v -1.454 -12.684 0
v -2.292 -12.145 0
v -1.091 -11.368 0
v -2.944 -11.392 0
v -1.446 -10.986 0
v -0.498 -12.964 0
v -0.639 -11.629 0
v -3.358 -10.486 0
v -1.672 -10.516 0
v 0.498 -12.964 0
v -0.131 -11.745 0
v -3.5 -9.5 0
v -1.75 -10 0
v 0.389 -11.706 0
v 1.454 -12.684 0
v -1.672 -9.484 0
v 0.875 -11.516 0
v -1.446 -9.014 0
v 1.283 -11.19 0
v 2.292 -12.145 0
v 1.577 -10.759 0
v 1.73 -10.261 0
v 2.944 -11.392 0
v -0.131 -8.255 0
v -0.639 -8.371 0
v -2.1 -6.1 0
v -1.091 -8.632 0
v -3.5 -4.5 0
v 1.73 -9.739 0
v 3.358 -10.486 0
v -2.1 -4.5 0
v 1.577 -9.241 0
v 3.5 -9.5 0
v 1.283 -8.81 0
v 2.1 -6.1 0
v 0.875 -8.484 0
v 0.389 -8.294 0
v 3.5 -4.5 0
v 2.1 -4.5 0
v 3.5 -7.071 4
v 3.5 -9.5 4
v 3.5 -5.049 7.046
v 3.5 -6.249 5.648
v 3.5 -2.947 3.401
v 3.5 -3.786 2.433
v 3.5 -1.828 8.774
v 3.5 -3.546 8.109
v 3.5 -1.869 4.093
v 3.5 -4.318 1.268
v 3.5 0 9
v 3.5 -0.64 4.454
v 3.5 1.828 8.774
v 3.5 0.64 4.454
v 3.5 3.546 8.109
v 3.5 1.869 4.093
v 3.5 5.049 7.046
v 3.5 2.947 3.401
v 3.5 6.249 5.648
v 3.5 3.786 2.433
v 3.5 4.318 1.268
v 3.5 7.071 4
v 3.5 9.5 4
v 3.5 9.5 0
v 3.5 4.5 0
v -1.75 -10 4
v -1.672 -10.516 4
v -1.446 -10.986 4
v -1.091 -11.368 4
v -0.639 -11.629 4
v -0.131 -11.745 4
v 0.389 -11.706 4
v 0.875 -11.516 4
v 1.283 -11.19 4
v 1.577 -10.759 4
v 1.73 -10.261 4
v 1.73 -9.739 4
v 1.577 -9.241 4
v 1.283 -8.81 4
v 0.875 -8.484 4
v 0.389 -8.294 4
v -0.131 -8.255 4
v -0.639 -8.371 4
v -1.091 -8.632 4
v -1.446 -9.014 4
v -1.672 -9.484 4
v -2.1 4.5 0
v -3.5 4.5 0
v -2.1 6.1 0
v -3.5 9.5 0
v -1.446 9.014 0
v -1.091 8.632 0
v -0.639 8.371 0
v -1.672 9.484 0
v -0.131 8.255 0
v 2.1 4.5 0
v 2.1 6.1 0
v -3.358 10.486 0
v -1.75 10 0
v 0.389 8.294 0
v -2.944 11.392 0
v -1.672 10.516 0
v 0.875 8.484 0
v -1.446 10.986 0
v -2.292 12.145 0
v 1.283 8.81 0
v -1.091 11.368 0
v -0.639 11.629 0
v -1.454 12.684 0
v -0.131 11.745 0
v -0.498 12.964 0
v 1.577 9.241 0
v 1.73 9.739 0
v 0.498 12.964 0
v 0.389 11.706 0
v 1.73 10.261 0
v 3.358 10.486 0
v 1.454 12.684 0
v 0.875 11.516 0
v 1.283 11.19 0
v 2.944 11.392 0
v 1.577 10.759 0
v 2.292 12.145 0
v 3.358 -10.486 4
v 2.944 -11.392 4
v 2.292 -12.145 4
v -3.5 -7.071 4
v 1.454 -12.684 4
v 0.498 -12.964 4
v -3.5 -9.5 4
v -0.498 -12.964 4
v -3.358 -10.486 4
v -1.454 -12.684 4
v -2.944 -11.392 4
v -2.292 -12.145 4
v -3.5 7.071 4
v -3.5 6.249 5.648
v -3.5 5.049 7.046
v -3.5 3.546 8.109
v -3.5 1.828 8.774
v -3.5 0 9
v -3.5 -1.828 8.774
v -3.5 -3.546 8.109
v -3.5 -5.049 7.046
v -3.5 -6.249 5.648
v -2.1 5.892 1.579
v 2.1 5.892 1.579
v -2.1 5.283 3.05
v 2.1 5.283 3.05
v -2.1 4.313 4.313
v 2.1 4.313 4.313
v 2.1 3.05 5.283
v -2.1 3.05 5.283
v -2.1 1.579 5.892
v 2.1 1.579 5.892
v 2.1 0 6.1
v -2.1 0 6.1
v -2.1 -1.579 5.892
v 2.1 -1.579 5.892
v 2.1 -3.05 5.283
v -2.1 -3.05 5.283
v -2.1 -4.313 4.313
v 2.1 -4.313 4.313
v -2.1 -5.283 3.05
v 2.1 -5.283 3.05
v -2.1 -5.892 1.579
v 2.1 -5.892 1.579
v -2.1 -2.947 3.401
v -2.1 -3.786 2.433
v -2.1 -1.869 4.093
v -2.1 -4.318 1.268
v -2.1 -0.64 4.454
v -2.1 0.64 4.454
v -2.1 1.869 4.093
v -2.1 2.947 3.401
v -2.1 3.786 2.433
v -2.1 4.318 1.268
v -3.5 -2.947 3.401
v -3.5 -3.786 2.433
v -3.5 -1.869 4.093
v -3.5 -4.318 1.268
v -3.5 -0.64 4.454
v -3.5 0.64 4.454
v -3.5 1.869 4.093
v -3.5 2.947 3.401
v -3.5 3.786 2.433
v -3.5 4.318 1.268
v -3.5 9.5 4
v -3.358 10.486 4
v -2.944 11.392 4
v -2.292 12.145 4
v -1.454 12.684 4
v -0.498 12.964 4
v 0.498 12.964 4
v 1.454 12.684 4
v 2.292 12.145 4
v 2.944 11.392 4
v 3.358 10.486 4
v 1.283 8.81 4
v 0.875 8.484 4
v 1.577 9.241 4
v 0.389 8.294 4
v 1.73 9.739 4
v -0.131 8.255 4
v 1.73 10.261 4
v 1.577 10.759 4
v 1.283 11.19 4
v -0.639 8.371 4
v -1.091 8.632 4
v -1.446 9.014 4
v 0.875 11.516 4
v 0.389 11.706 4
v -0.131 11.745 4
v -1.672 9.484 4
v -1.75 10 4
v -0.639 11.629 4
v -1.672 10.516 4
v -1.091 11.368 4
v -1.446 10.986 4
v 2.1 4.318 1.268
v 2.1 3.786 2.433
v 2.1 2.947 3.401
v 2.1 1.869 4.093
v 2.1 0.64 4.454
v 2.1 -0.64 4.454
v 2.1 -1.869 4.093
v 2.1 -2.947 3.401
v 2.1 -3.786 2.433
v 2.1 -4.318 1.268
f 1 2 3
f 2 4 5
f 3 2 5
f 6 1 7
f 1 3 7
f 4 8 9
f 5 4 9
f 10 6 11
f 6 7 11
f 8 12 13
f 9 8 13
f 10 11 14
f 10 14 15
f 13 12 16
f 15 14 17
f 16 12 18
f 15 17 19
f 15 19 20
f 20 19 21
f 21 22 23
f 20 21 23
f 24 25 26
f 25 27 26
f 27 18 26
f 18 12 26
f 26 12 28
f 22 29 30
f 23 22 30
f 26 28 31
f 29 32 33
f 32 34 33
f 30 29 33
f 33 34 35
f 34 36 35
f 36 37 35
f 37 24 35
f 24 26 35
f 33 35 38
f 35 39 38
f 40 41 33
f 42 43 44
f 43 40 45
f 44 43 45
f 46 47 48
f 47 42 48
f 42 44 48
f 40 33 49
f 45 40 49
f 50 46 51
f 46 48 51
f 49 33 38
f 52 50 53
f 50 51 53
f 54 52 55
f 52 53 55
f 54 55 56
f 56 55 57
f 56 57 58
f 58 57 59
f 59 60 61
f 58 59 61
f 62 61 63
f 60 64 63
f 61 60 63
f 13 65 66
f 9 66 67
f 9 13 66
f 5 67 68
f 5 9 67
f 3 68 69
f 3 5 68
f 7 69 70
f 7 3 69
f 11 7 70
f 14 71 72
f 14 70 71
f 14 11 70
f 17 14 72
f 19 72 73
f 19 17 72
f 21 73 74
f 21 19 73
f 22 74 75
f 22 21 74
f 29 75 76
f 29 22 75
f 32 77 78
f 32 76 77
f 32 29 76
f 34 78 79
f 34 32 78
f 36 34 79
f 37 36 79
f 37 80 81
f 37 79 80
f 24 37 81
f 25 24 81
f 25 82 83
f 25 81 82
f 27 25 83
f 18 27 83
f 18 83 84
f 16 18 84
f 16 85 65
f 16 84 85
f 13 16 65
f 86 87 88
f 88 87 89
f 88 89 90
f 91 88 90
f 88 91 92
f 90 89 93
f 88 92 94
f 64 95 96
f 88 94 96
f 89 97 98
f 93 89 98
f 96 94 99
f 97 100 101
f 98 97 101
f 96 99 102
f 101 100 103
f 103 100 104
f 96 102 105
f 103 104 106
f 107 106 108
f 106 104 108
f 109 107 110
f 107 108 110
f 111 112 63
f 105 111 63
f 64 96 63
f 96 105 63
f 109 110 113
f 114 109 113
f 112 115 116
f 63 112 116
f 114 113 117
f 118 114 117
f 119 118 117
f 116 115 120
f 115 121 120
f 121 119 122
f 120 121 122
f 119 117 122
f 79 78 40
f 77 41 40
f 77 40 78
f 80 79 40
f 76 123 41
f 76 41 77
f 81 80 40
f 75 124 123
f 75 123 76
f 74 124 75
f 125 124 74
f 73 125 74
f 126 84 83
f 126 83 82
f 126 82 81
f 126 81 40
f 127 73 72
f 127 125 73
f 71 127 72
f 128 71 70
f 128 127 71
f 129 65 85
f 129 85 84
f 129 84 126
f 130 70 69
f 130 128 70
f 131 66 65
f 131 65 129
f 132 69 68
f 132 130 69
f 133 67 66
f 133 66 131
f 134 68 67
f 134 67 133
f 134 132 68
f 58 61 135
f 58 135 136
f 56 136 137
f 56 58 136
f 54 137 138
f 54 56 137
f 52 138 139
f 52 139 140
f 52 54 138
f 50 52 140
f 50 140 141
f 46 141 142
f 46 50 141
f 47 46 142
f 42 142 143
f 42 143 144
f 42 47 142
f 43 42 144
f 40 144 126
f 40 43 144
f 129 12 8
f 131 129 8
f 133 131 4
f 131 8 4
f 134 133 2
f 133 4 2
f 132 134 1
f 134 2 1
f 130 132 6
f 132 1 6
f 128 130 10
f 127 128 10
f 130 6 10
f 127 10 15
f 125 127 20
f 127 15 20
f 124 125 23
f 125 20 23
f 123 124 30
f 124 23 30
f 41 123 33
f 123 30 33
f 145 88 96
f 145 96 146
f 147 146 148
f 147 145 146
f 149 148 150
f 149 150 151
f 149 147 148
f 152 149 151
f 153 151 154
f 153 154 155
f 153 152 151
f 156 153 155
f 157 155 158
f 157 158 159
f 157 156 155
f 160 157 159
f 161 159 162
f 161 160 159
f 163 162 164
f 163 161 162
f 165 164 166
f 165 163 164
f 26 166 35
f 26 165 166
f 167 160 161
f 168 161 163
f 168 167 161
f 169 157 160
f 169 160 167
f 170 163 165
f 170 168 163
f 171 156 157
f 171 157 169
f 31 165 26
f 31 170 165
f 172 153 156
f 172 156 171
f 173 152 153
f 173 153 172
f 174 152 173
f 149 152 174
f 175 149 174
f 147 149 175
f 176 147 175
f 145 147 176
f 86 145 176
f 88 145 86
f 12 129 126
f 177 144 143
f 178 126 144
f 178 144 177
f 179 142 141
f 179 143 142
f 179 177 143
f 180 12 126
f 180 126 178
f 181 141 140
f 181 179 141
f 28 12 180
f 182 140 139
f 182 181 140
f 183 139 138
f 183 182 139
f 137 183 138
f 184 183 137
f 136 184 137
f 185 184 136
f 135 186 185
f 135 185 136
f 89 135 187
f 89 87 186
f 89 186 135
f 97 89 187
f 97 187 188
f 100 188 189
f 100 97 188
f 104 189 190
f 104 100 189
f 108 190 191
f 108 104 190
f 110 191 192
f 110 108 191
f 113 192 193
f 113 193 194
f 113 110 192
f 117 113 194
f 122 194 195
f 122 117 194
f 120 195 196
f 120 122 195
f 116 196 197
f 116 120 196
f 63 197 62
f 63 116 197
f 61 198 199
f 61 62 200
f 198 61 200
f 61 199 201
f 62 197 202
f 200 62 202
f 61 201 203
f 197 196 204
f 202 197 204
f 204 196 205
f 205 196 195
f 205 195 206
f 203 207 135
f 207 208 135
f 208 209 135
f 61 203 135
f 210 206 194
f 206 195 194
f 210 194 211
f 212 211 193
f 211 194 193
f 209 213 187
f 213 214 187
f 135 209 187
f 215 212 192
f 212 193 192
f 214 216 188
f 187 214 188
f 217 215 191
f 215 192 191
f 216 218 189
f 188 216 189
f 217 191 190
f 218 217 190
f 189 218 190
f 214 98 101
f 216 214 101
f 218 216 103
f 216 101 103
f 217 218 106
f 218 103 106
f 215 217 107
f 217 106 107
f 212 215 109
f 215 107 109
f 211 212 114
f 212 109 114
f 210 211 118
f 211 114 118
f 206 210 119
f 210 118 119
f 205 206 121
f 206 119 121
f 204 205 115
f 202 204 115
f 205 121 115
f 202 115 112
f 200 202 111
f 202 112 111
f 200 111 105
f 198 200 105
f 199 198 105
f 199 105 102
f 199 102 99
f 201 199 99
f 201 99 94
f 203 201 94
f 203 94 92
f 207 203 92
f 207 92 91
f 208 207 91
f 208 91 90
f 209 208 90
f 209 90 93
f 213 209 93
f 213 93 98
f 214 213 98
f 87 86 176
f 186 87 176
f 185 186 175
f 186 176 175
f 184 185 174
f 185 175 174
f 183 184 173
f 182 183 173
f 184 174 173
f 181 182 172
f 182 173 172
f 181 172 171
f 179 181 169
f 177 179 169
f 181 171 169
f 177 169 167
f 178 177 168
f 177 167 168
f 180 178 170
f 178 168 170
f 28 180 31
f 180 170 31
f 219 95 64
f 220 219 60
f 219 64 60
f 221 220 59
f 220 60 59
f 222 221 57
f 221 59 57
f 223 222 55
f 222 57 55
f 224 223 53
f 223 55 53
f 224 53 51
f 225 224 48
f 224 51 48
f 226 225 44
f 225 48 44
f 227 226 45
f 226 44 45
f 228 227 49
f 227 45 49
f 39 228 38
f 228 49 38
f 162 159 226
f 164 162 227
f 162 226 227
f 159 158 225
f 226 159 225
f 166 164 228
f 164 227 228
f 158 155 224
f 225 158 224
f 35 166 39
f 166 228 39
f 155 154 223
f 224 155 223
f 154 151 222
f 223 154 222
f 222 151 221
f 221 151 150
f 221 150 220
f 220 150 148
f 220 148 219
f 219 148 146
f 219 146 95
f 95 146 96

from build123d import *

# Parameters (mm, degrees)
SKETCH1_W               = 7
SKETCH1_H               = 15
BOSS_EXTRUDE1_DEPTH     = 9
SKETCH2_R               = 4.5
CUT_EXTRUDE1_DEPTH      = 14.647344064
CUT_EXTRUDE2_DEPTH      = 2.1
CUT_EXTRUDE2_DEPTH_BACK = 2.1
SKETCH3_R               = 6.1
FILLET1_R               = 7.5
BOSS_EXTRUDE2_DEPTH     = 4
SKETCH5_R               = 1.75
CUT_EXTRUDE3_DEPTH      = 17.194134741


with BuildPart() as part:
    # Sketch1 → Boss-Extrude1 (new body)
    with BuildSketch(Plane.XY):
        Rectangle(SKETCH1_W, SKETCH1_H)
    extrude(amount=BOSS_EXTRUDE1_DEPTH)

    # Sketch2 → Cut-Extrude1 (cut, through all)
    with BuildSketch(Plane(origin=(3.5, 0, 0), x_dir=(0, 0, -1), z_dir=(1, 0, 0))):
        Circle(SKETCH2_R)
    extrude(amount=-CUT_EXTRUDE1_DEPTH, mode=Mode.SUBTRACT)

    # Sketch3 → Cut-Extrude2 (cut, two sides: drawn at the far end of the back side and taken through both)
    with BuildSketch(Plane(origin=(0, 0, 0), x_dir=(0, 0, -1), z_dir=(1, 0, 0)).offset(-CUT_EXTRUDE2_DEPTH_BACK)):
        Circle(SKETCH3_R)
    extrude(amount=CUT_EXTRUDE2_DEPTH + CUT_EXTRUDE2_DEPTH_BACK, mode=Mode.SUBTRACT)

    # Fillet1
    fillet1_edges = [part.edges().sort_by_distance(p)[0] for p in [
        (0, -7.5, 9),
        (0, 7.5, 9),
    ]]
    fillet(fillet1_edges, radius=FILLET1_R - 0.0001)  # a hair under: the kernel refuses the full size

    # Sketch4 → Boss-Extrude2 (add)
    with BuildSketch(Plane.XY):
        with BuildLine():
            Line((-3.5, 6.507281557), (-3.5, 9.5))
            ThreePointArc((-3.5, 9.5), (0, 13), (3.5, 9.5))
            Line((3.5, 9.5), (3.5, 6.507281557))
            Line((3.5, 6.507281557), (-3.5, 6.507281557))
        make_face()
    boss_extrude2 = extrude(amount=BOSS_EXTRUDE2_DEPTH)

    # Sketch5 → Cut-Extrude3 (cut, through all)
    with BuildSketch(Plane(origin=(0, 0, 0), x_dir=(-1, 0, 0), z_dir=(0, 0, -1))):
        with Locations((0, 10)):
            Circle(SKETCH5_R)
    cut_extrude3 = extrude(amount=-CUT_EXTRUDE3_DEPTH, mode=Mode.SUBTRACT)

    # Mirror1: Boss-Extrude2, Cut-Extrude3 across plane
    add(boss_extrude2.mirror(Plane.ZX))
    add(cut_extrude3.mirror(Plane.ZX), mode=Mode.SUBTRACT)


solid = part.part
